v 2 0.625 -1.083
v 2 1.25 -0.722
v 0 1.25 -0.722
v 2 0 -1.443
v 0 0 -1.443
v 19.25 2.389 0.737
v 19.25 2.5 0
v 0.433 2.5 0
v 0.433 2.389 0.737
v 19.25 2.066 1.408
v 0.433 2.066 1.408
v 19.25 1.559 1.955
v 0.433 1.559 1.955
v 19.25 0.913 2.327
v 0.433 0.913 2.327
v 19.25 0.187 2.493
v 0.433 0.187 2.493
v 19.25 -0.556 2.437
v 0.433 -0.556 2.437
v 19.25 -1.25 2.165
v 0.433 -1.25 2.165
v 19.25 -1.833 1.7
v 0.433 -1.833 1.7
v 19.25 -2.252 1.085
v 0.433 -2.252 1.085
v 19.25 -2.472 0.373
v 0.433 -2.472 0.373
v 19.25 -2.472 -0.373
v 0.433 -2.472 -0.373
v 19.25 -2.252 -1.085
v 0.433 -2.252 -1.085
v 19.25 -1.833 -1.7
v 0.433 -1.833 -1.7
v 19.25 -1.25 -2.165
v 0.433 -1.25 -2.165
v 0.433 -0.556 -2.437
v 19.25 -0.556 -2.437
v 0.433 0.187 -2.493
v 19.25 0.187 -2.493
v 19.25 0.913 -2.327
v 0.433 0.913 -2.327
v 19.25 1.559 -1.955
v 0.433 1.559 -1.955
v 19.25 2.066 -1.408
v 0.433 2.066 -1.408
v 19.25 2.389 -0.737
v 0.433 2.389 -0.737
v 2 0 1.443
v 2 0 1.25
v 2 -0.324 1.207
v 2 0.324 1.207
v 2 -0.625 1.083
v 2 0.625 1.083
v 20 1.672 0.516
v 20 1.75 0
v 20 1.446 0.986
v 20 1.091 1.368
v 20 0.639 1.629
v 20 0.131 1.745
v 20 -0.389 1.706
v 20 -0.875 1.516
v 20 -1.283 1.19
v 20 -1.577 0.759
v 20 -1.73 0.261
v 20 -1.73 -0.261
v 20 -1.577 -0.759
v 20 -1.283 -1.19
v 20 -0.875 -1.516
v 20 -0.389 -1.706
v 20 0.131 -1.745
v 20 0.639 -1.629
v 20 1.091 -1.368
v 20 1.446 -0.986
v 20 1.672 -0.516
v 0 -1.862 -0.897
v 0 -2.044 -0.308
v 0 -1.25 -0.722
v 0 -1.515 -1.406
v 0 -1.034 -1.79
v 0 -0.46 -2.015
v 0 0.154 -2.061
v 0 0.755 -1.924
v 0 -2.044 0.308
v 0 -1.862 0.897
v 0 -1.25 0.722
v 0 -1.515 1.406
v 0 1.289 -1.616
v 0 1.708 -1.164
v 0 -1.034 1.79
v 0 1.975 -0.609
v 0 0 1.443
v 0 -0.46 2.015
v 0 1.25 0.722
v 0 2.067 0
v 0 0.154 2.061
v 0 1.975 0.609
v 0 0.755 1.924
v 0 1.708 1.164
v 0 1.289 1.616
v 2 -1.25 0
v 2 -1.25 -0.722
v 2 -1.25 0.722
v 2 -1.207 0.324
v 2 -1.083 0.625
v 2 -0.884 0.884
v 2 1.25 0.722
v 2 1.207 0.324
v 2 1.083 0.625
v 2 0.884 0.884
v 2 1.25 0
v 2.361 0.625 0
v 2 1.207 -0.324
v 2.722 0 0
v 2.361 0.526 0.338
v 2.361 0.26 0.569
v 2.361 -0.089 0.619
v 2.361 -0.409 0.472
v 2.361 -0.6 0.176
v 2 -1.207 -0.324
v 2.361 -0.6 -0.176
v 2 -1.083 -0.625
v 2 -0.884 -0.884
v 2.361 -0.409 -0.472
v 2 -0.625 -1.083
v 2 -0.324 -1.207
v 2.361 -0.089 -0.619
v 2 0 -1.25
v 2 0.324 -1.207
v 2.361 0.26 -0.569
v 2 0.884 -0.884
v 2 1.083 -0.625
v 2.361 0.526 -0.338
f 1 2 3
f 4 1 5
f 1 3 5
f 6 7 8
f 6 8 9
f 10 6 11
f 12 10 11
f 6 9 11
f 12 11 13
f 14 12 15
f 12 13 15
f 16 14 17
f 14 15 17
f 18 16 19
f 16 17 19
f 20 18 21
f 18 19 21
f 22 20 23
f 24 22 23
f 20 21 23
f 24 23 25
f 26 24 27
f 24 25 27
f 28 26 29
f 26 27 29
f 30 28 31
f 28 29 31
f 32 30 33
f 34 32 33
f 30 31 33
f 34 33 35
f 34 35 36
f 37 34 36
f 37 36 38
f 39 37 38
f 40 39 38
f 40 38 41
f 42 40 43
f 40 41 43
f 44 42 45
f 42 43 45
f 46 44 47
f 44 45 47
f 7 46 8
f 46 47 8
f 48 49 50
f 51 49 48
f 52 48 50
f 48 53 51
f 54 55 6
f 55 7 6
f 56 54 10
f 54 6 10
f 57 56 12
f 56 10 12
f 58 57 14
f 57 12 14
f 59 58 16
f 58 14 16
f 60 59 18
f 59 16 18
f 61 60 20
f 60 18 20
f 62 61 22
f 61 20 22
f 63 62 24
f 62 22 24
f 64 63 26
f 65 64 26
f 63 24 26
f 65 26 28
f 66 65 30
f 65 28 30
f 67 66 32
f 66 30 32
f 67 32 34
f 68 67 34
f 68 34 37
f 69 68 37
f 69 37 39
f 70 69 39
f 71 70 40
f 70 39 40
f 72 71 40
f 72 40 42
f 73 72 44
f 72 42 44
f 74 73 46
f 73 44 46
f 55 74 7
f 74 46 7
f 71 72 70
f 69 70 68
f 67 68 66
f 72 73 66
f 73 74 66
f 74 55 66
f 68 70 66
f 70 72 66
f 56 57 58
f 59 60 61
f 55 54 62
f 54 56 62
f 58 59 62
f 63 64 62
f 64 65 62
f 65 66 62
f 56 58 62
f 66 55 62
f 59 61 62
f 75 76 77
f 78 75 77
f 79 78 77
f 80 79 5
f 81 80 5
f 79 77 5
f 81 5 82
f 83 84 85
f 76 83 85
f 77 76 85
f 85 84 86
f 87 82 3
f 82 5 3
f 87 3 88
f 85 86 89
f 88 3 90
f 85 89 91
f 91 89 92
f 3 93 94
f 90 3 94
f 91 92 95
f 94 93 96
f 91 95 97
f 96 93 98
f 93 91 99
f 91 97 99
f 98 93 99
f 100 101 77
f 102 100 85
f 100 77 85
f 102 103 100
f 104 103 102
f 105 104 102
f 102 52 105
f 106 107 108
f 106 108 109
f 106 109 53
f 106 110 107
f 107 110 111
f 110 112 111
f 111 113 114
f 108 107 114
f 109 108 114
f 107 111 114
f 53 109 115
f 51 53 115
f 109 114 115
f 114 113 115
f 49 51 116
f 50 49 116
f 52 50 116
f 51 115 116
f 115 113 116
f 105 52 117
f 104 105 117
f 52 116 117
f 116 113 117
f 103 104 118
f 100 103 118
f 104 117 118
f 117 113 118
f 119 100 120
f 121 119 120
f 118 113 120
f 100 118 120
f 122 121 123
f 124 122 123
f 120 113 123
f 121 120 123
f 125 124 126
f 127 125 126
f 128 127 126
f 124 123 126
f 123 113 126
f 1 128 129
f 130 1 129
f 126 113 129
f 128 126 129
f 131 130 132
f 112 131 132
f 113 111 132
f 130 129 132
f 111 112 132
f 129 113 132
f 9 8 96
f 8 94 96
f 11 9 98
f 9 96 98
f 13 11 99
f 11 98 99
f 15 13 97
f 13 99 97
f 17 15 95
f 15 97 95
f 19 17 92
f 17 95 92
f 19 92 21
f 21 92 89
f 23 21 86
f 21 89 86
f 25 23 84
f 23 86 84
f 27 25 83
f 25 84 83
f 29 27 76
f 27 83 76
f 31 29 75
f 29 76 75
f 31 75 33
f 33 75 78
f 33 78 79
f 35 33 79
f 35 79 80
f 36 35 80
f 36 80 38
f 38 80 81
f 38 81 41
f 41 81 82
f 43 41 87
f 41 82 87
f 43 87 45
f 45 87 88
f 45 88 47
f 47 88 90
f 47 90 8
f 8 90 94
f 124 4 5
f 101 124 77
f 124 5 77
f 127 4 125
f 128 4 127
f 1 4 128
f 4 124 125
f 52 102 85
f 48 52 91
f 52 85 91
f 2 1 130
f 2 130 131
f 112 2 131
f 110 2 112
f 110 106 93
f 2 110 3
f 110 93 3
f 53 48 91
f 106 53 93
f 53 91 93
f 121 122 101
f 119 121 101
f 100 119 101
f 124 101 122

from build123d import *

# Parameters (mm, degrees)
HEXAGONSOCKET_DEPTH = 2


with BuildPart() as part:
    # Sketch1 → Base (revolve)
    with BuildSketch(Plane.XY):
        Polygon((0, 0), (20, 0), (20, 1.75), (19.25, 2.5), (0.433, 2.5), (0, 2.067), align=None)
    revolve(axis=Axis((-10.745014543, 0, 0), (1, 0, 0)))

    # Sketch2 → HexagonSocket (cut)
    with BuildSketch(Plane(origin=(0, -0.021932325, 0.010138848), x_dir=(0, 0, 1), z_dir=(-1, 0, 0))):
        Polygon((1.433236825, 0.021932325), (0.711548988, 1.271932325), (-0.731826685, 1.271932325), (-1.453514521, 0.021932325), (-0.731826685, -1.228067675), (0.711548988, -1.228067675), align=None)
    extrude(amount=-HEXAGONSOCKET_DEPTH, mode=Mode.SUBTRACT)

    # Sketch3 → Cut-Revolve1 (revolve, cut)
    with BuildSketch(Plane.XY):
        Polygon((2, 1.25), (2.721687837, 0), (2, 0), align=None)
    revolve(axis=Axis((-3.144113667, 0, 0), (1, 0, 0)), mode=Mode.SUBTRACT)


solid = part.part
